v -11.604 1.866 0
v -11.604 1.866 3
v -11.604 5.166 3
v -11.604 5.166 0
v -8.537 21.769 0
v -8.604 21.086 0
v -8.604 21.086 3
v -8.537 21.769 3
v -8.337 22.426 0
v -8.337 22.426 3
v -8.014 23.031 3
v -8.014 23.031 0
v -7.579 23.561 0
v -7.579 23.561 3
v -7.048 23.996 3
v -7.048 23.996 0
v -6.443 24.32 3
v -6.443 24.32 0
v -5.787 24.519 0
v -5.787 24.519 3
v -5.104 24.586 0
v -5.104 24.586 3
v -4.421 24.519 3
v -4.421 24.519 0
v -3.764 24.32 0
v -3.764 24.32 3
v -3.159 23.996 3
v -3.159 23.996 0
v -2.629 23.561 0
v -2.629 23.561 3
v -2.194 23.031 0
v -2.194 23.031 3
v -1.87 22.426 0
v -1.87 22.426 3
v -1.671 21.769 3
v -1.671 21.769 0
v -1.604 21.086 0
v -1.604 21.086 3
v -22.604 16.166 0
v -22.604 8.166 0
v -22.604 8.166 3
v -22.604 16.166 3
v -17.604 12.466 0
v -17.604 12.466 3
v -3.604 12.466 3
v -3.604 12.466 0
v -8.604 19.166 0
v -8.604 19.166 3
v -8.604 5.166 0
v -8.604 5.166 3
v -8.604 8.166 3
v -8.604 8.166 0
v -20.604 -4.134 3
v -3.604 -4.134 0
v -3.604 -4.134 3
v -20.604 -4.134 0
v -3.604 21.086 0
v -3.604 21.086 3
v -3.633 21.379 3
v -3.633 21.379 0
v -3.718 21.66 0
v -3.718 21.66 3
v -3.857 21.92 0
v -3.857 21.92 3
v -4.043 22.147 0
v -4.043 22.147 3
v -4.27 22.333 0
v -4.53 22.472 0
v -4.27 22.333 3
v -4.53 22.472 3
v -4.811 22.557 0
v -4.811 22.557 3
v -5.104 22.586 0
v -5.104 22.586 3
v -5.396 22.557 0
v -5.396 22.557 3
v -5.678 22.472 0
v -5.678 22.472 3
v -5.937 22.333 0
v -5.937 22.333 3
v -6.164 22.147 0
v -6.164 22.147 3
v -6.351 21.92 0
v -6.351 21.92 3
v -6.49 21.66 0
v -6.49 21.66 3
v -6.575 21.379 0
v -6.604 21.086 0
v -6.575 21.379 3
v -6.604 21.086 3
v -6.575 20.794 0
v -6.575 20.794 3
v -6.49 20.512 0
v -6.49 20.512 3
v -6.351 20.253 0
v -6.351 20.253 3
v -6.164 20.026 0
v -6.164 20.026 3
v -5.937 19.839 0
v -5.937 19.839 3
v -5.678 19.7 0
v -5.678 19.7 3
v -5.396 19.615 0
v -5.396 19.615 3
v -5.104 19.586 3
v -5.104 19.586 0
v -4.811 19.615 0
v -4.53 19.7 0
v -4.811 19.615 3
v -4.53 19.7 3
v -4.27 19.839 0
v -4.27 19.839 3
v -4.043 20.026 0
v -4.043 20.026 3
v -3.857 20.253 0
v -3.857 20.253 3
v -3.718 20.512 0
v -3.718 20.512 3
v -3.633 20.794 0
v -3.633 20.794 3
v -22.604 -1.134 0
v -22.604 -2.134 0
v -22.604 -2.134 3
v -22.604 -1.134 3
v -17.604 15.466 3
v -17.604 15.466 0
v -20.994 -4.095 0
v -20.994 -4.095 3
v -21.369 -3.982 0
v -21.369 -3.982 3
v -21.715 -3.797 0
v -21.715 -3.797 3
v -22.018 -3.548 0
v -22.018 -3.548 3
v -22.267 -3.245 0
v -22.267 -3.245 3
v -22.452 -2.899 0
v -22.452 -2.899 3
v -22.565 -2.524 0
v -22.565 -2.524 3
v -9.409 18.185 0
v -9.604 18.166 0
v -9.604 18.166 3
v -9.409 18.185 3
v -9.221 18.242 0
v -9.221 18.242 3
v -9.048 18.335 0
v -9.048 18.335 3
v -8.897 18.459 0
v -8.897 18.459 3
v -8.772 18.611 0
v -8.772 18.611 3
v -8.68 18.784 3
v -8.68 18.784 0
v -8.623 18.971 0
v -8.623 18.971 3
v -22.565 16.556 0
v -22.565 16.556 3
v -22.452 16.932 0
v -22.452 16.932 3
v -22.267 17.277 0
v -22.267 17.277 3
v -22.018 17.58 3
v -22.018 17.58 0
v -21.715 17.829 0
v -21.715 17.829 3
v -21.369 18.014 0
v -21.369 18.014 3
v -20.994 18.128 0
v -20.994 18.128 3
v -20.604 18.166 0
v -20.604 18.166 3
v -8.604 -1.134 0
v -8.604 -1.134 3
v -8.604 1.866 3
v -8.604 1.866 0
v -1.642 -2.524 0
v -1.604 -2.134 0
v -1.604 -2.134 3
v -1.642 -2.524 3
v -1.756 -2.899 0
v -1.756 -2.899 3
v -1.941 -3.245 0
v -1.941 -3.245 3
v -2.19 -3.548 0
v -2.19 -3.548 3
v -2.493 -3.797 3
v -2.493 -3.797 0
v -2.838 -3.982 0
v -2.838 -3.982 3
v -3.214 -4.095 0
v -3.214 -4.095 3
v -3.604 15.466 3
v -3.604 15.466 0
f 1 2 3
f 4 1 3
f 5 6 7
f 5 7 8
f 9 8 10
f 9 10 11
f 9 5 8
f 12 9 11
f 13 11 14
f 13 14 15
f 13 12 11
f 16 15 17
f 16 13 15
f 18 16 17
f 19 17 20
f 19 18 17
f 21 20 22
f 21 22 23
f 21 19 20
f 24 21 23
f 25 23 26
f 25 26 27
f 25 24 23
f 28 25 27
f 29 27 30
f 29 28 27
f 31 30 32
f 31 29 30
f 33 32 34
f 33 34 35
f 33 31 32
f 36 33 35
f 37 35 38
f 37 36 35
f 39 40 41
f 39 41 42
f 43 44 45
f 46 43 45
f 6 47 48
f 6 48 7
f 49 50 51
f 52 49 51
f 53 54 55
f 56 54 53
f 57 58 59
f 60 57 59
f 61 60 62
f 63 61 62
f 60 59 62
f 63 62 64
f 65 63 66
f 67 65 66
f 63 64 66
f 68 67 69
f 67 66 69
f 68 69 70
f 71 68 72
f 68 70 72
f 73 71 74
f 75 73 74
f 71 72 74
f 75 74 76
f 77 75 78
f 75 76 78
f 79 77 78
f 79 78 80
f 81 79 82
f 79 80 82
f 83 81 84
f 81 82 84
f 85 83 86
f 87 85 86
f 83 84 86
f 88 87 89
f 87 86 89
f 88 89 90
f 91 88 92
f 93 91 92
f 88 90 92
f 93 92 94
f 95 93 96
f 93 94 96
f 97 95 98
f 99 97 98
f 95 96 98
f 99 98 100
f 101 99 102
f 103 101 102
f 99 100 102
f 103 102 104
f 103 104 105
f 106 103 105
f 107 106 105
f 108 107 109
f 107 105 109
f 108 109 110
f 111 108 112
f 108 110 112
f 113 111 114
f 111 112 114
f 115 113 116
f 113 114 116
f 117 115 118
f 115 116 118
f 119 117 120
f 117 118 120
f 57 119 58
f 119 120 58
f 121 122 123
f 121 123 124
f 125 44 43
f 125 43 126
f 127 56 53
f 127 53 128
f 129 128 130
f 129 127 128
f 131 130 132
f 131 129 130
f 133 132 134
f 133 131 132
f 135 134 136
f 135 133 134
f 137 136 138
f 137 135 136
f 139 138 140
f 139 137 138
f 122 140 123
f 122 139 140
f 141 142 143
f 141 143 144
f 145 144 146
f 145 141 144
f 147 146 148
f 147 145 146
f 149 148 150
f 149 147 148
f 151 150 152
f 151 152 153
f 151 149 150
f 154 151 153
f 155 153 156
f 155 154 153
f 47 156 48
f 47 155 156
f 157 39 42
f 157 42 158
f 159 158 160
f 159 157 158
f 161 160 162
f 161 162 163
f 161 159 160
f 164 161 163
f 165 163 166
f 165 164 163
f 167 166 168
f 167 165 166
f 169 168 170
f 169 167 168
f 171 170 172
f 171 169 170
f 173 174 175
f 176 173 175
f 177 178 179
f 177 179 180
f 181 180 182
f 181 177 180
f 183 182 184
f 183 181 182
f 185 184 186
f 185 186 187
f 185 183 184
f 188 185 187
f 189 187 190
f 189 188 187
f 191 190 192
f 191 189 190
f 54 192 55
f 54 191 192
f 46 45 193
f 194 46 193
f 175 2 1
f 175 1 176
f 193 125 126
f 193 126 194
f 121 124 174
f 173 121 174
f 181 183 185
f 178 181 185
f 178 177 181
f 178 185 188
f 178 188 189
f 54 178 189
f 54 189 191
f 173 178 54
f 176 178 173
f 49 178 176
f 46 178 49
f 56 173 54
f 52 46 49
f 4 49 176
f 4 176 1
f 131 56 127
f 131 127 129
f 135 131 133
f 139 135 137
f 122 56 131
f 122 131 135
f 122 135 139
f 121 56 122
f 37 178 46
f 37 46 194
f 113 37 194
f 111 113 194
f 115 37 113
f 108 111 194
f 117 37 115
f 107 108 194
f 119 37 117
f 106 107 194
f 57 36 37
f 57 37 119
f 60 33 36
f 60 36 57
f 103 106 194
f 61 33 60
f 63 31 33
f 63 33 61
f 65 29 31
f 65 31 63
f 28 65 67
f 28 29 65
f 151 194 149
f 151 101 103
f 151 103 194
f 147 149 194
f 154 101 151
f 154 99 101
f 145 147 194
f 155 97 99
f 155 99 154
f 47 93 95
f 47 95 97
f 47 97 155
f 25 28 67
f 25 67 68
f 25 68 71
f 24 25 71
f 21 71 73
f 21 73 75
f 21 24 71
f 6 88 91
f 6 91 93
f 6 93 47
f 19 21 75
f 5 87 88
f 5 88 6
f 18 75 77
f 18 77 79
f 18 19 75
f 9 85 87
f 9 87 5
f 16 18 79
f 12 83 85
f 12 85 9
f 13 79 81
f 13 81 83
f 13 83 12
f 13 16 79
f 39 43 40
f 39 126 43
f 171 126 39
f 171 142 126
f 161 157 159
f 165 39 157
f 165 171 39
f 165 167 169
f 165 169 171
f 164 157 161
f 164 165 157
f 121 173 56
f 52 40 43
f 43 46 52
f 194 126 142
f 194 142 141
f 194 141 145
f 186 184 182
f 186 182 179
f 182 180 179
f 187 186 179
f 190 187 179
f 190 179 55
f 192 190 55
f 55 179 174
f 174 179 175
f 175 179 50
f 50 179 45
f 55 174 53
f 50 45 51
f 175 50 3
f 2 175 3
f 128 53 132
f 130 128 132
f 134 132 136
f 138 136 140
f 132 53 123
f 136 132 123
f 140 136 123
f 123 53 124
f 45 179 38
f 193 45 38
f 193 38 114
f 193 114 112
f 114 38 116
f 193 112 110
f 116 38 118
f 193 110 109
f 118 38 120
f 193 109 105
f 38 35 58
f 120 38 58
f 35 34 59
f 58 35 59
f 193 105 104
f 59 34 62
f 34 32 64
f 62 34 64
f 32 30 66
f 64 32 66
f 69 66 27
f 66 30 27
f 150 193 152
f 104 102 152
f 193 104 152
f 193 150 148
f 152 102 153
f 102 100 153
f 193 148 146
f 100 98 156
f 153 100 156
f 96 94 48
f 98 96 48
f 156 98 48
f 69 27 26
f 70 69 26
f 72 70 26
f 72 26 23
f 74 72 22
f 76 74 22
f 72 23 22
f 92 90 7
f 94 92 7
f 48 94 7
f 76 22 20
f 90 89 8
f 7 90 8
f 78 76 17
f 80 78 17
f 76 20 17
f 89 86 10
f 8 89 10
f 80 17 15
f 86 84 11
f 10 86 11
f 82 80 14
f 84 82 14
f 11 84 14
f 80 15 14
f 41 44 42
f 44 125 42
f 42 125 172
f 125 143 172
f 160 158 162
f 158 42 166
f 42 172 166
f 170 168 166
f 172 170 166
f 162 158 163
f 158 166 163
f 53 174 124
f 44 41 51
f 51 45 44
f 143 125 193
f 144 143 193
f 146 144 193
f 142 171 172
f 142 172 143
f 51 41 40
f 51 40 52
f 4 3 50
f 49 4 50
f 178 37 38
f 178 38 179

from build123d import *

# Parameters (mm, degrees)
BOSS_EXTRUDE1_DEPTH = 3
SKETCH4_W           = 14
SKETCH4_H           = 3
CUT_EXTRUDE1_DEPTH  = 3
SKETCH5_R           = 1.5
CUT_EXTRUDE2_DEPTH  = 3
SKETCH6_W           = 11
SKETCH6_H           = 3.3
CUT_EXTRUDE3_DEPTH  = 3


with BuildPart() as part:
    # Sketch2 → Boss-Extrude1 (new body)
    with BuildSketch(Plane.XY):
        with BuildLine():
            Line((-1.603783622, 21.086206065), (-1.603783622, -2.133793935))
            ThreePointArc((-1.603783622, -2.133793935), (-2.189570059, -3.548007497), (-3.603783622, -4.133793935))
            Line((-3.603783622, -4.133793935), (-20.603783622, -4.133793935))
            ThreePointArc((-20.603783622, -4.133793935), (-22.017997184, -3.548007497), (-22.603783622, -2.133793935))
            Line((-22.603783622, -2.133793935), (-22.603783622, 16.166206065))
            ThreePointArc((-22.603783622, 16.166206065), (-22.017997184, 17.580419628), (-20.603783622, 18.166206065))
            Line((-20.603783622, 18.166206065), (-9.603783622, 18.166206065))
            ThreePointArc((-9.603783622, 18.166206065), (-8.896676841, 18.459099284), (-8.603783622, 19.166206065))
            Line((-8.603783622, 19.166206065), (-8.603783622, 21.086206065))
            ThreePointArc((-8.603783622, 21.086206065), (-5.103783622, 24.586206065), (-1.603783622, 21.086206065))
        make_face()
    extrude(amount=BOSS_EXTRUDE1_DEPTH)

    # Sketch4 → Cut-Extrude1 (cut)
    with BuildSketch(Plane.XY.offset(3)):
        with Locations((-10.603783622, 13.966206065)):
            Rectangle(SKETCH4_W, SKETCH4_H)
        with Locations((-15.603783622, 6.666206065)):
            Rectangle(SKETCH4_W, SKETCH4_H)
        with Locations((-15.603783622, 0.366206065)):
            Rectangle(SKETCH4_W, SKETCH4_H)
    extrude(amount=-CUT_EXTRUDE1_DEPTH, mode=Mode.SUBTRACT)

    # Sketch5 → Cut-Extrude2 (cut)
    with BuildSketch(Plane.XY.offset(3)):
        with Locations((-5.103783622, 21.086206065)):
            Circle(SKETCH5_R)
    extrude(amount=-CUT_EXTRUDE2_DEPTH, mode=Mode.SUBTRACT)

    # Sketch6 → Cut-Extrude3 (cut)
    with BuildSketch(Plane.XY.offset(3)):
        with Locations((-17.103783622, 3.516206065)):
            Rectangle(SKETCH6_W, SKETCH6_H)
    extrude(amount=-CUT_EXTRUDE3_DEPTH, mode=Mode.SUBTRACT)


solid = part.part
